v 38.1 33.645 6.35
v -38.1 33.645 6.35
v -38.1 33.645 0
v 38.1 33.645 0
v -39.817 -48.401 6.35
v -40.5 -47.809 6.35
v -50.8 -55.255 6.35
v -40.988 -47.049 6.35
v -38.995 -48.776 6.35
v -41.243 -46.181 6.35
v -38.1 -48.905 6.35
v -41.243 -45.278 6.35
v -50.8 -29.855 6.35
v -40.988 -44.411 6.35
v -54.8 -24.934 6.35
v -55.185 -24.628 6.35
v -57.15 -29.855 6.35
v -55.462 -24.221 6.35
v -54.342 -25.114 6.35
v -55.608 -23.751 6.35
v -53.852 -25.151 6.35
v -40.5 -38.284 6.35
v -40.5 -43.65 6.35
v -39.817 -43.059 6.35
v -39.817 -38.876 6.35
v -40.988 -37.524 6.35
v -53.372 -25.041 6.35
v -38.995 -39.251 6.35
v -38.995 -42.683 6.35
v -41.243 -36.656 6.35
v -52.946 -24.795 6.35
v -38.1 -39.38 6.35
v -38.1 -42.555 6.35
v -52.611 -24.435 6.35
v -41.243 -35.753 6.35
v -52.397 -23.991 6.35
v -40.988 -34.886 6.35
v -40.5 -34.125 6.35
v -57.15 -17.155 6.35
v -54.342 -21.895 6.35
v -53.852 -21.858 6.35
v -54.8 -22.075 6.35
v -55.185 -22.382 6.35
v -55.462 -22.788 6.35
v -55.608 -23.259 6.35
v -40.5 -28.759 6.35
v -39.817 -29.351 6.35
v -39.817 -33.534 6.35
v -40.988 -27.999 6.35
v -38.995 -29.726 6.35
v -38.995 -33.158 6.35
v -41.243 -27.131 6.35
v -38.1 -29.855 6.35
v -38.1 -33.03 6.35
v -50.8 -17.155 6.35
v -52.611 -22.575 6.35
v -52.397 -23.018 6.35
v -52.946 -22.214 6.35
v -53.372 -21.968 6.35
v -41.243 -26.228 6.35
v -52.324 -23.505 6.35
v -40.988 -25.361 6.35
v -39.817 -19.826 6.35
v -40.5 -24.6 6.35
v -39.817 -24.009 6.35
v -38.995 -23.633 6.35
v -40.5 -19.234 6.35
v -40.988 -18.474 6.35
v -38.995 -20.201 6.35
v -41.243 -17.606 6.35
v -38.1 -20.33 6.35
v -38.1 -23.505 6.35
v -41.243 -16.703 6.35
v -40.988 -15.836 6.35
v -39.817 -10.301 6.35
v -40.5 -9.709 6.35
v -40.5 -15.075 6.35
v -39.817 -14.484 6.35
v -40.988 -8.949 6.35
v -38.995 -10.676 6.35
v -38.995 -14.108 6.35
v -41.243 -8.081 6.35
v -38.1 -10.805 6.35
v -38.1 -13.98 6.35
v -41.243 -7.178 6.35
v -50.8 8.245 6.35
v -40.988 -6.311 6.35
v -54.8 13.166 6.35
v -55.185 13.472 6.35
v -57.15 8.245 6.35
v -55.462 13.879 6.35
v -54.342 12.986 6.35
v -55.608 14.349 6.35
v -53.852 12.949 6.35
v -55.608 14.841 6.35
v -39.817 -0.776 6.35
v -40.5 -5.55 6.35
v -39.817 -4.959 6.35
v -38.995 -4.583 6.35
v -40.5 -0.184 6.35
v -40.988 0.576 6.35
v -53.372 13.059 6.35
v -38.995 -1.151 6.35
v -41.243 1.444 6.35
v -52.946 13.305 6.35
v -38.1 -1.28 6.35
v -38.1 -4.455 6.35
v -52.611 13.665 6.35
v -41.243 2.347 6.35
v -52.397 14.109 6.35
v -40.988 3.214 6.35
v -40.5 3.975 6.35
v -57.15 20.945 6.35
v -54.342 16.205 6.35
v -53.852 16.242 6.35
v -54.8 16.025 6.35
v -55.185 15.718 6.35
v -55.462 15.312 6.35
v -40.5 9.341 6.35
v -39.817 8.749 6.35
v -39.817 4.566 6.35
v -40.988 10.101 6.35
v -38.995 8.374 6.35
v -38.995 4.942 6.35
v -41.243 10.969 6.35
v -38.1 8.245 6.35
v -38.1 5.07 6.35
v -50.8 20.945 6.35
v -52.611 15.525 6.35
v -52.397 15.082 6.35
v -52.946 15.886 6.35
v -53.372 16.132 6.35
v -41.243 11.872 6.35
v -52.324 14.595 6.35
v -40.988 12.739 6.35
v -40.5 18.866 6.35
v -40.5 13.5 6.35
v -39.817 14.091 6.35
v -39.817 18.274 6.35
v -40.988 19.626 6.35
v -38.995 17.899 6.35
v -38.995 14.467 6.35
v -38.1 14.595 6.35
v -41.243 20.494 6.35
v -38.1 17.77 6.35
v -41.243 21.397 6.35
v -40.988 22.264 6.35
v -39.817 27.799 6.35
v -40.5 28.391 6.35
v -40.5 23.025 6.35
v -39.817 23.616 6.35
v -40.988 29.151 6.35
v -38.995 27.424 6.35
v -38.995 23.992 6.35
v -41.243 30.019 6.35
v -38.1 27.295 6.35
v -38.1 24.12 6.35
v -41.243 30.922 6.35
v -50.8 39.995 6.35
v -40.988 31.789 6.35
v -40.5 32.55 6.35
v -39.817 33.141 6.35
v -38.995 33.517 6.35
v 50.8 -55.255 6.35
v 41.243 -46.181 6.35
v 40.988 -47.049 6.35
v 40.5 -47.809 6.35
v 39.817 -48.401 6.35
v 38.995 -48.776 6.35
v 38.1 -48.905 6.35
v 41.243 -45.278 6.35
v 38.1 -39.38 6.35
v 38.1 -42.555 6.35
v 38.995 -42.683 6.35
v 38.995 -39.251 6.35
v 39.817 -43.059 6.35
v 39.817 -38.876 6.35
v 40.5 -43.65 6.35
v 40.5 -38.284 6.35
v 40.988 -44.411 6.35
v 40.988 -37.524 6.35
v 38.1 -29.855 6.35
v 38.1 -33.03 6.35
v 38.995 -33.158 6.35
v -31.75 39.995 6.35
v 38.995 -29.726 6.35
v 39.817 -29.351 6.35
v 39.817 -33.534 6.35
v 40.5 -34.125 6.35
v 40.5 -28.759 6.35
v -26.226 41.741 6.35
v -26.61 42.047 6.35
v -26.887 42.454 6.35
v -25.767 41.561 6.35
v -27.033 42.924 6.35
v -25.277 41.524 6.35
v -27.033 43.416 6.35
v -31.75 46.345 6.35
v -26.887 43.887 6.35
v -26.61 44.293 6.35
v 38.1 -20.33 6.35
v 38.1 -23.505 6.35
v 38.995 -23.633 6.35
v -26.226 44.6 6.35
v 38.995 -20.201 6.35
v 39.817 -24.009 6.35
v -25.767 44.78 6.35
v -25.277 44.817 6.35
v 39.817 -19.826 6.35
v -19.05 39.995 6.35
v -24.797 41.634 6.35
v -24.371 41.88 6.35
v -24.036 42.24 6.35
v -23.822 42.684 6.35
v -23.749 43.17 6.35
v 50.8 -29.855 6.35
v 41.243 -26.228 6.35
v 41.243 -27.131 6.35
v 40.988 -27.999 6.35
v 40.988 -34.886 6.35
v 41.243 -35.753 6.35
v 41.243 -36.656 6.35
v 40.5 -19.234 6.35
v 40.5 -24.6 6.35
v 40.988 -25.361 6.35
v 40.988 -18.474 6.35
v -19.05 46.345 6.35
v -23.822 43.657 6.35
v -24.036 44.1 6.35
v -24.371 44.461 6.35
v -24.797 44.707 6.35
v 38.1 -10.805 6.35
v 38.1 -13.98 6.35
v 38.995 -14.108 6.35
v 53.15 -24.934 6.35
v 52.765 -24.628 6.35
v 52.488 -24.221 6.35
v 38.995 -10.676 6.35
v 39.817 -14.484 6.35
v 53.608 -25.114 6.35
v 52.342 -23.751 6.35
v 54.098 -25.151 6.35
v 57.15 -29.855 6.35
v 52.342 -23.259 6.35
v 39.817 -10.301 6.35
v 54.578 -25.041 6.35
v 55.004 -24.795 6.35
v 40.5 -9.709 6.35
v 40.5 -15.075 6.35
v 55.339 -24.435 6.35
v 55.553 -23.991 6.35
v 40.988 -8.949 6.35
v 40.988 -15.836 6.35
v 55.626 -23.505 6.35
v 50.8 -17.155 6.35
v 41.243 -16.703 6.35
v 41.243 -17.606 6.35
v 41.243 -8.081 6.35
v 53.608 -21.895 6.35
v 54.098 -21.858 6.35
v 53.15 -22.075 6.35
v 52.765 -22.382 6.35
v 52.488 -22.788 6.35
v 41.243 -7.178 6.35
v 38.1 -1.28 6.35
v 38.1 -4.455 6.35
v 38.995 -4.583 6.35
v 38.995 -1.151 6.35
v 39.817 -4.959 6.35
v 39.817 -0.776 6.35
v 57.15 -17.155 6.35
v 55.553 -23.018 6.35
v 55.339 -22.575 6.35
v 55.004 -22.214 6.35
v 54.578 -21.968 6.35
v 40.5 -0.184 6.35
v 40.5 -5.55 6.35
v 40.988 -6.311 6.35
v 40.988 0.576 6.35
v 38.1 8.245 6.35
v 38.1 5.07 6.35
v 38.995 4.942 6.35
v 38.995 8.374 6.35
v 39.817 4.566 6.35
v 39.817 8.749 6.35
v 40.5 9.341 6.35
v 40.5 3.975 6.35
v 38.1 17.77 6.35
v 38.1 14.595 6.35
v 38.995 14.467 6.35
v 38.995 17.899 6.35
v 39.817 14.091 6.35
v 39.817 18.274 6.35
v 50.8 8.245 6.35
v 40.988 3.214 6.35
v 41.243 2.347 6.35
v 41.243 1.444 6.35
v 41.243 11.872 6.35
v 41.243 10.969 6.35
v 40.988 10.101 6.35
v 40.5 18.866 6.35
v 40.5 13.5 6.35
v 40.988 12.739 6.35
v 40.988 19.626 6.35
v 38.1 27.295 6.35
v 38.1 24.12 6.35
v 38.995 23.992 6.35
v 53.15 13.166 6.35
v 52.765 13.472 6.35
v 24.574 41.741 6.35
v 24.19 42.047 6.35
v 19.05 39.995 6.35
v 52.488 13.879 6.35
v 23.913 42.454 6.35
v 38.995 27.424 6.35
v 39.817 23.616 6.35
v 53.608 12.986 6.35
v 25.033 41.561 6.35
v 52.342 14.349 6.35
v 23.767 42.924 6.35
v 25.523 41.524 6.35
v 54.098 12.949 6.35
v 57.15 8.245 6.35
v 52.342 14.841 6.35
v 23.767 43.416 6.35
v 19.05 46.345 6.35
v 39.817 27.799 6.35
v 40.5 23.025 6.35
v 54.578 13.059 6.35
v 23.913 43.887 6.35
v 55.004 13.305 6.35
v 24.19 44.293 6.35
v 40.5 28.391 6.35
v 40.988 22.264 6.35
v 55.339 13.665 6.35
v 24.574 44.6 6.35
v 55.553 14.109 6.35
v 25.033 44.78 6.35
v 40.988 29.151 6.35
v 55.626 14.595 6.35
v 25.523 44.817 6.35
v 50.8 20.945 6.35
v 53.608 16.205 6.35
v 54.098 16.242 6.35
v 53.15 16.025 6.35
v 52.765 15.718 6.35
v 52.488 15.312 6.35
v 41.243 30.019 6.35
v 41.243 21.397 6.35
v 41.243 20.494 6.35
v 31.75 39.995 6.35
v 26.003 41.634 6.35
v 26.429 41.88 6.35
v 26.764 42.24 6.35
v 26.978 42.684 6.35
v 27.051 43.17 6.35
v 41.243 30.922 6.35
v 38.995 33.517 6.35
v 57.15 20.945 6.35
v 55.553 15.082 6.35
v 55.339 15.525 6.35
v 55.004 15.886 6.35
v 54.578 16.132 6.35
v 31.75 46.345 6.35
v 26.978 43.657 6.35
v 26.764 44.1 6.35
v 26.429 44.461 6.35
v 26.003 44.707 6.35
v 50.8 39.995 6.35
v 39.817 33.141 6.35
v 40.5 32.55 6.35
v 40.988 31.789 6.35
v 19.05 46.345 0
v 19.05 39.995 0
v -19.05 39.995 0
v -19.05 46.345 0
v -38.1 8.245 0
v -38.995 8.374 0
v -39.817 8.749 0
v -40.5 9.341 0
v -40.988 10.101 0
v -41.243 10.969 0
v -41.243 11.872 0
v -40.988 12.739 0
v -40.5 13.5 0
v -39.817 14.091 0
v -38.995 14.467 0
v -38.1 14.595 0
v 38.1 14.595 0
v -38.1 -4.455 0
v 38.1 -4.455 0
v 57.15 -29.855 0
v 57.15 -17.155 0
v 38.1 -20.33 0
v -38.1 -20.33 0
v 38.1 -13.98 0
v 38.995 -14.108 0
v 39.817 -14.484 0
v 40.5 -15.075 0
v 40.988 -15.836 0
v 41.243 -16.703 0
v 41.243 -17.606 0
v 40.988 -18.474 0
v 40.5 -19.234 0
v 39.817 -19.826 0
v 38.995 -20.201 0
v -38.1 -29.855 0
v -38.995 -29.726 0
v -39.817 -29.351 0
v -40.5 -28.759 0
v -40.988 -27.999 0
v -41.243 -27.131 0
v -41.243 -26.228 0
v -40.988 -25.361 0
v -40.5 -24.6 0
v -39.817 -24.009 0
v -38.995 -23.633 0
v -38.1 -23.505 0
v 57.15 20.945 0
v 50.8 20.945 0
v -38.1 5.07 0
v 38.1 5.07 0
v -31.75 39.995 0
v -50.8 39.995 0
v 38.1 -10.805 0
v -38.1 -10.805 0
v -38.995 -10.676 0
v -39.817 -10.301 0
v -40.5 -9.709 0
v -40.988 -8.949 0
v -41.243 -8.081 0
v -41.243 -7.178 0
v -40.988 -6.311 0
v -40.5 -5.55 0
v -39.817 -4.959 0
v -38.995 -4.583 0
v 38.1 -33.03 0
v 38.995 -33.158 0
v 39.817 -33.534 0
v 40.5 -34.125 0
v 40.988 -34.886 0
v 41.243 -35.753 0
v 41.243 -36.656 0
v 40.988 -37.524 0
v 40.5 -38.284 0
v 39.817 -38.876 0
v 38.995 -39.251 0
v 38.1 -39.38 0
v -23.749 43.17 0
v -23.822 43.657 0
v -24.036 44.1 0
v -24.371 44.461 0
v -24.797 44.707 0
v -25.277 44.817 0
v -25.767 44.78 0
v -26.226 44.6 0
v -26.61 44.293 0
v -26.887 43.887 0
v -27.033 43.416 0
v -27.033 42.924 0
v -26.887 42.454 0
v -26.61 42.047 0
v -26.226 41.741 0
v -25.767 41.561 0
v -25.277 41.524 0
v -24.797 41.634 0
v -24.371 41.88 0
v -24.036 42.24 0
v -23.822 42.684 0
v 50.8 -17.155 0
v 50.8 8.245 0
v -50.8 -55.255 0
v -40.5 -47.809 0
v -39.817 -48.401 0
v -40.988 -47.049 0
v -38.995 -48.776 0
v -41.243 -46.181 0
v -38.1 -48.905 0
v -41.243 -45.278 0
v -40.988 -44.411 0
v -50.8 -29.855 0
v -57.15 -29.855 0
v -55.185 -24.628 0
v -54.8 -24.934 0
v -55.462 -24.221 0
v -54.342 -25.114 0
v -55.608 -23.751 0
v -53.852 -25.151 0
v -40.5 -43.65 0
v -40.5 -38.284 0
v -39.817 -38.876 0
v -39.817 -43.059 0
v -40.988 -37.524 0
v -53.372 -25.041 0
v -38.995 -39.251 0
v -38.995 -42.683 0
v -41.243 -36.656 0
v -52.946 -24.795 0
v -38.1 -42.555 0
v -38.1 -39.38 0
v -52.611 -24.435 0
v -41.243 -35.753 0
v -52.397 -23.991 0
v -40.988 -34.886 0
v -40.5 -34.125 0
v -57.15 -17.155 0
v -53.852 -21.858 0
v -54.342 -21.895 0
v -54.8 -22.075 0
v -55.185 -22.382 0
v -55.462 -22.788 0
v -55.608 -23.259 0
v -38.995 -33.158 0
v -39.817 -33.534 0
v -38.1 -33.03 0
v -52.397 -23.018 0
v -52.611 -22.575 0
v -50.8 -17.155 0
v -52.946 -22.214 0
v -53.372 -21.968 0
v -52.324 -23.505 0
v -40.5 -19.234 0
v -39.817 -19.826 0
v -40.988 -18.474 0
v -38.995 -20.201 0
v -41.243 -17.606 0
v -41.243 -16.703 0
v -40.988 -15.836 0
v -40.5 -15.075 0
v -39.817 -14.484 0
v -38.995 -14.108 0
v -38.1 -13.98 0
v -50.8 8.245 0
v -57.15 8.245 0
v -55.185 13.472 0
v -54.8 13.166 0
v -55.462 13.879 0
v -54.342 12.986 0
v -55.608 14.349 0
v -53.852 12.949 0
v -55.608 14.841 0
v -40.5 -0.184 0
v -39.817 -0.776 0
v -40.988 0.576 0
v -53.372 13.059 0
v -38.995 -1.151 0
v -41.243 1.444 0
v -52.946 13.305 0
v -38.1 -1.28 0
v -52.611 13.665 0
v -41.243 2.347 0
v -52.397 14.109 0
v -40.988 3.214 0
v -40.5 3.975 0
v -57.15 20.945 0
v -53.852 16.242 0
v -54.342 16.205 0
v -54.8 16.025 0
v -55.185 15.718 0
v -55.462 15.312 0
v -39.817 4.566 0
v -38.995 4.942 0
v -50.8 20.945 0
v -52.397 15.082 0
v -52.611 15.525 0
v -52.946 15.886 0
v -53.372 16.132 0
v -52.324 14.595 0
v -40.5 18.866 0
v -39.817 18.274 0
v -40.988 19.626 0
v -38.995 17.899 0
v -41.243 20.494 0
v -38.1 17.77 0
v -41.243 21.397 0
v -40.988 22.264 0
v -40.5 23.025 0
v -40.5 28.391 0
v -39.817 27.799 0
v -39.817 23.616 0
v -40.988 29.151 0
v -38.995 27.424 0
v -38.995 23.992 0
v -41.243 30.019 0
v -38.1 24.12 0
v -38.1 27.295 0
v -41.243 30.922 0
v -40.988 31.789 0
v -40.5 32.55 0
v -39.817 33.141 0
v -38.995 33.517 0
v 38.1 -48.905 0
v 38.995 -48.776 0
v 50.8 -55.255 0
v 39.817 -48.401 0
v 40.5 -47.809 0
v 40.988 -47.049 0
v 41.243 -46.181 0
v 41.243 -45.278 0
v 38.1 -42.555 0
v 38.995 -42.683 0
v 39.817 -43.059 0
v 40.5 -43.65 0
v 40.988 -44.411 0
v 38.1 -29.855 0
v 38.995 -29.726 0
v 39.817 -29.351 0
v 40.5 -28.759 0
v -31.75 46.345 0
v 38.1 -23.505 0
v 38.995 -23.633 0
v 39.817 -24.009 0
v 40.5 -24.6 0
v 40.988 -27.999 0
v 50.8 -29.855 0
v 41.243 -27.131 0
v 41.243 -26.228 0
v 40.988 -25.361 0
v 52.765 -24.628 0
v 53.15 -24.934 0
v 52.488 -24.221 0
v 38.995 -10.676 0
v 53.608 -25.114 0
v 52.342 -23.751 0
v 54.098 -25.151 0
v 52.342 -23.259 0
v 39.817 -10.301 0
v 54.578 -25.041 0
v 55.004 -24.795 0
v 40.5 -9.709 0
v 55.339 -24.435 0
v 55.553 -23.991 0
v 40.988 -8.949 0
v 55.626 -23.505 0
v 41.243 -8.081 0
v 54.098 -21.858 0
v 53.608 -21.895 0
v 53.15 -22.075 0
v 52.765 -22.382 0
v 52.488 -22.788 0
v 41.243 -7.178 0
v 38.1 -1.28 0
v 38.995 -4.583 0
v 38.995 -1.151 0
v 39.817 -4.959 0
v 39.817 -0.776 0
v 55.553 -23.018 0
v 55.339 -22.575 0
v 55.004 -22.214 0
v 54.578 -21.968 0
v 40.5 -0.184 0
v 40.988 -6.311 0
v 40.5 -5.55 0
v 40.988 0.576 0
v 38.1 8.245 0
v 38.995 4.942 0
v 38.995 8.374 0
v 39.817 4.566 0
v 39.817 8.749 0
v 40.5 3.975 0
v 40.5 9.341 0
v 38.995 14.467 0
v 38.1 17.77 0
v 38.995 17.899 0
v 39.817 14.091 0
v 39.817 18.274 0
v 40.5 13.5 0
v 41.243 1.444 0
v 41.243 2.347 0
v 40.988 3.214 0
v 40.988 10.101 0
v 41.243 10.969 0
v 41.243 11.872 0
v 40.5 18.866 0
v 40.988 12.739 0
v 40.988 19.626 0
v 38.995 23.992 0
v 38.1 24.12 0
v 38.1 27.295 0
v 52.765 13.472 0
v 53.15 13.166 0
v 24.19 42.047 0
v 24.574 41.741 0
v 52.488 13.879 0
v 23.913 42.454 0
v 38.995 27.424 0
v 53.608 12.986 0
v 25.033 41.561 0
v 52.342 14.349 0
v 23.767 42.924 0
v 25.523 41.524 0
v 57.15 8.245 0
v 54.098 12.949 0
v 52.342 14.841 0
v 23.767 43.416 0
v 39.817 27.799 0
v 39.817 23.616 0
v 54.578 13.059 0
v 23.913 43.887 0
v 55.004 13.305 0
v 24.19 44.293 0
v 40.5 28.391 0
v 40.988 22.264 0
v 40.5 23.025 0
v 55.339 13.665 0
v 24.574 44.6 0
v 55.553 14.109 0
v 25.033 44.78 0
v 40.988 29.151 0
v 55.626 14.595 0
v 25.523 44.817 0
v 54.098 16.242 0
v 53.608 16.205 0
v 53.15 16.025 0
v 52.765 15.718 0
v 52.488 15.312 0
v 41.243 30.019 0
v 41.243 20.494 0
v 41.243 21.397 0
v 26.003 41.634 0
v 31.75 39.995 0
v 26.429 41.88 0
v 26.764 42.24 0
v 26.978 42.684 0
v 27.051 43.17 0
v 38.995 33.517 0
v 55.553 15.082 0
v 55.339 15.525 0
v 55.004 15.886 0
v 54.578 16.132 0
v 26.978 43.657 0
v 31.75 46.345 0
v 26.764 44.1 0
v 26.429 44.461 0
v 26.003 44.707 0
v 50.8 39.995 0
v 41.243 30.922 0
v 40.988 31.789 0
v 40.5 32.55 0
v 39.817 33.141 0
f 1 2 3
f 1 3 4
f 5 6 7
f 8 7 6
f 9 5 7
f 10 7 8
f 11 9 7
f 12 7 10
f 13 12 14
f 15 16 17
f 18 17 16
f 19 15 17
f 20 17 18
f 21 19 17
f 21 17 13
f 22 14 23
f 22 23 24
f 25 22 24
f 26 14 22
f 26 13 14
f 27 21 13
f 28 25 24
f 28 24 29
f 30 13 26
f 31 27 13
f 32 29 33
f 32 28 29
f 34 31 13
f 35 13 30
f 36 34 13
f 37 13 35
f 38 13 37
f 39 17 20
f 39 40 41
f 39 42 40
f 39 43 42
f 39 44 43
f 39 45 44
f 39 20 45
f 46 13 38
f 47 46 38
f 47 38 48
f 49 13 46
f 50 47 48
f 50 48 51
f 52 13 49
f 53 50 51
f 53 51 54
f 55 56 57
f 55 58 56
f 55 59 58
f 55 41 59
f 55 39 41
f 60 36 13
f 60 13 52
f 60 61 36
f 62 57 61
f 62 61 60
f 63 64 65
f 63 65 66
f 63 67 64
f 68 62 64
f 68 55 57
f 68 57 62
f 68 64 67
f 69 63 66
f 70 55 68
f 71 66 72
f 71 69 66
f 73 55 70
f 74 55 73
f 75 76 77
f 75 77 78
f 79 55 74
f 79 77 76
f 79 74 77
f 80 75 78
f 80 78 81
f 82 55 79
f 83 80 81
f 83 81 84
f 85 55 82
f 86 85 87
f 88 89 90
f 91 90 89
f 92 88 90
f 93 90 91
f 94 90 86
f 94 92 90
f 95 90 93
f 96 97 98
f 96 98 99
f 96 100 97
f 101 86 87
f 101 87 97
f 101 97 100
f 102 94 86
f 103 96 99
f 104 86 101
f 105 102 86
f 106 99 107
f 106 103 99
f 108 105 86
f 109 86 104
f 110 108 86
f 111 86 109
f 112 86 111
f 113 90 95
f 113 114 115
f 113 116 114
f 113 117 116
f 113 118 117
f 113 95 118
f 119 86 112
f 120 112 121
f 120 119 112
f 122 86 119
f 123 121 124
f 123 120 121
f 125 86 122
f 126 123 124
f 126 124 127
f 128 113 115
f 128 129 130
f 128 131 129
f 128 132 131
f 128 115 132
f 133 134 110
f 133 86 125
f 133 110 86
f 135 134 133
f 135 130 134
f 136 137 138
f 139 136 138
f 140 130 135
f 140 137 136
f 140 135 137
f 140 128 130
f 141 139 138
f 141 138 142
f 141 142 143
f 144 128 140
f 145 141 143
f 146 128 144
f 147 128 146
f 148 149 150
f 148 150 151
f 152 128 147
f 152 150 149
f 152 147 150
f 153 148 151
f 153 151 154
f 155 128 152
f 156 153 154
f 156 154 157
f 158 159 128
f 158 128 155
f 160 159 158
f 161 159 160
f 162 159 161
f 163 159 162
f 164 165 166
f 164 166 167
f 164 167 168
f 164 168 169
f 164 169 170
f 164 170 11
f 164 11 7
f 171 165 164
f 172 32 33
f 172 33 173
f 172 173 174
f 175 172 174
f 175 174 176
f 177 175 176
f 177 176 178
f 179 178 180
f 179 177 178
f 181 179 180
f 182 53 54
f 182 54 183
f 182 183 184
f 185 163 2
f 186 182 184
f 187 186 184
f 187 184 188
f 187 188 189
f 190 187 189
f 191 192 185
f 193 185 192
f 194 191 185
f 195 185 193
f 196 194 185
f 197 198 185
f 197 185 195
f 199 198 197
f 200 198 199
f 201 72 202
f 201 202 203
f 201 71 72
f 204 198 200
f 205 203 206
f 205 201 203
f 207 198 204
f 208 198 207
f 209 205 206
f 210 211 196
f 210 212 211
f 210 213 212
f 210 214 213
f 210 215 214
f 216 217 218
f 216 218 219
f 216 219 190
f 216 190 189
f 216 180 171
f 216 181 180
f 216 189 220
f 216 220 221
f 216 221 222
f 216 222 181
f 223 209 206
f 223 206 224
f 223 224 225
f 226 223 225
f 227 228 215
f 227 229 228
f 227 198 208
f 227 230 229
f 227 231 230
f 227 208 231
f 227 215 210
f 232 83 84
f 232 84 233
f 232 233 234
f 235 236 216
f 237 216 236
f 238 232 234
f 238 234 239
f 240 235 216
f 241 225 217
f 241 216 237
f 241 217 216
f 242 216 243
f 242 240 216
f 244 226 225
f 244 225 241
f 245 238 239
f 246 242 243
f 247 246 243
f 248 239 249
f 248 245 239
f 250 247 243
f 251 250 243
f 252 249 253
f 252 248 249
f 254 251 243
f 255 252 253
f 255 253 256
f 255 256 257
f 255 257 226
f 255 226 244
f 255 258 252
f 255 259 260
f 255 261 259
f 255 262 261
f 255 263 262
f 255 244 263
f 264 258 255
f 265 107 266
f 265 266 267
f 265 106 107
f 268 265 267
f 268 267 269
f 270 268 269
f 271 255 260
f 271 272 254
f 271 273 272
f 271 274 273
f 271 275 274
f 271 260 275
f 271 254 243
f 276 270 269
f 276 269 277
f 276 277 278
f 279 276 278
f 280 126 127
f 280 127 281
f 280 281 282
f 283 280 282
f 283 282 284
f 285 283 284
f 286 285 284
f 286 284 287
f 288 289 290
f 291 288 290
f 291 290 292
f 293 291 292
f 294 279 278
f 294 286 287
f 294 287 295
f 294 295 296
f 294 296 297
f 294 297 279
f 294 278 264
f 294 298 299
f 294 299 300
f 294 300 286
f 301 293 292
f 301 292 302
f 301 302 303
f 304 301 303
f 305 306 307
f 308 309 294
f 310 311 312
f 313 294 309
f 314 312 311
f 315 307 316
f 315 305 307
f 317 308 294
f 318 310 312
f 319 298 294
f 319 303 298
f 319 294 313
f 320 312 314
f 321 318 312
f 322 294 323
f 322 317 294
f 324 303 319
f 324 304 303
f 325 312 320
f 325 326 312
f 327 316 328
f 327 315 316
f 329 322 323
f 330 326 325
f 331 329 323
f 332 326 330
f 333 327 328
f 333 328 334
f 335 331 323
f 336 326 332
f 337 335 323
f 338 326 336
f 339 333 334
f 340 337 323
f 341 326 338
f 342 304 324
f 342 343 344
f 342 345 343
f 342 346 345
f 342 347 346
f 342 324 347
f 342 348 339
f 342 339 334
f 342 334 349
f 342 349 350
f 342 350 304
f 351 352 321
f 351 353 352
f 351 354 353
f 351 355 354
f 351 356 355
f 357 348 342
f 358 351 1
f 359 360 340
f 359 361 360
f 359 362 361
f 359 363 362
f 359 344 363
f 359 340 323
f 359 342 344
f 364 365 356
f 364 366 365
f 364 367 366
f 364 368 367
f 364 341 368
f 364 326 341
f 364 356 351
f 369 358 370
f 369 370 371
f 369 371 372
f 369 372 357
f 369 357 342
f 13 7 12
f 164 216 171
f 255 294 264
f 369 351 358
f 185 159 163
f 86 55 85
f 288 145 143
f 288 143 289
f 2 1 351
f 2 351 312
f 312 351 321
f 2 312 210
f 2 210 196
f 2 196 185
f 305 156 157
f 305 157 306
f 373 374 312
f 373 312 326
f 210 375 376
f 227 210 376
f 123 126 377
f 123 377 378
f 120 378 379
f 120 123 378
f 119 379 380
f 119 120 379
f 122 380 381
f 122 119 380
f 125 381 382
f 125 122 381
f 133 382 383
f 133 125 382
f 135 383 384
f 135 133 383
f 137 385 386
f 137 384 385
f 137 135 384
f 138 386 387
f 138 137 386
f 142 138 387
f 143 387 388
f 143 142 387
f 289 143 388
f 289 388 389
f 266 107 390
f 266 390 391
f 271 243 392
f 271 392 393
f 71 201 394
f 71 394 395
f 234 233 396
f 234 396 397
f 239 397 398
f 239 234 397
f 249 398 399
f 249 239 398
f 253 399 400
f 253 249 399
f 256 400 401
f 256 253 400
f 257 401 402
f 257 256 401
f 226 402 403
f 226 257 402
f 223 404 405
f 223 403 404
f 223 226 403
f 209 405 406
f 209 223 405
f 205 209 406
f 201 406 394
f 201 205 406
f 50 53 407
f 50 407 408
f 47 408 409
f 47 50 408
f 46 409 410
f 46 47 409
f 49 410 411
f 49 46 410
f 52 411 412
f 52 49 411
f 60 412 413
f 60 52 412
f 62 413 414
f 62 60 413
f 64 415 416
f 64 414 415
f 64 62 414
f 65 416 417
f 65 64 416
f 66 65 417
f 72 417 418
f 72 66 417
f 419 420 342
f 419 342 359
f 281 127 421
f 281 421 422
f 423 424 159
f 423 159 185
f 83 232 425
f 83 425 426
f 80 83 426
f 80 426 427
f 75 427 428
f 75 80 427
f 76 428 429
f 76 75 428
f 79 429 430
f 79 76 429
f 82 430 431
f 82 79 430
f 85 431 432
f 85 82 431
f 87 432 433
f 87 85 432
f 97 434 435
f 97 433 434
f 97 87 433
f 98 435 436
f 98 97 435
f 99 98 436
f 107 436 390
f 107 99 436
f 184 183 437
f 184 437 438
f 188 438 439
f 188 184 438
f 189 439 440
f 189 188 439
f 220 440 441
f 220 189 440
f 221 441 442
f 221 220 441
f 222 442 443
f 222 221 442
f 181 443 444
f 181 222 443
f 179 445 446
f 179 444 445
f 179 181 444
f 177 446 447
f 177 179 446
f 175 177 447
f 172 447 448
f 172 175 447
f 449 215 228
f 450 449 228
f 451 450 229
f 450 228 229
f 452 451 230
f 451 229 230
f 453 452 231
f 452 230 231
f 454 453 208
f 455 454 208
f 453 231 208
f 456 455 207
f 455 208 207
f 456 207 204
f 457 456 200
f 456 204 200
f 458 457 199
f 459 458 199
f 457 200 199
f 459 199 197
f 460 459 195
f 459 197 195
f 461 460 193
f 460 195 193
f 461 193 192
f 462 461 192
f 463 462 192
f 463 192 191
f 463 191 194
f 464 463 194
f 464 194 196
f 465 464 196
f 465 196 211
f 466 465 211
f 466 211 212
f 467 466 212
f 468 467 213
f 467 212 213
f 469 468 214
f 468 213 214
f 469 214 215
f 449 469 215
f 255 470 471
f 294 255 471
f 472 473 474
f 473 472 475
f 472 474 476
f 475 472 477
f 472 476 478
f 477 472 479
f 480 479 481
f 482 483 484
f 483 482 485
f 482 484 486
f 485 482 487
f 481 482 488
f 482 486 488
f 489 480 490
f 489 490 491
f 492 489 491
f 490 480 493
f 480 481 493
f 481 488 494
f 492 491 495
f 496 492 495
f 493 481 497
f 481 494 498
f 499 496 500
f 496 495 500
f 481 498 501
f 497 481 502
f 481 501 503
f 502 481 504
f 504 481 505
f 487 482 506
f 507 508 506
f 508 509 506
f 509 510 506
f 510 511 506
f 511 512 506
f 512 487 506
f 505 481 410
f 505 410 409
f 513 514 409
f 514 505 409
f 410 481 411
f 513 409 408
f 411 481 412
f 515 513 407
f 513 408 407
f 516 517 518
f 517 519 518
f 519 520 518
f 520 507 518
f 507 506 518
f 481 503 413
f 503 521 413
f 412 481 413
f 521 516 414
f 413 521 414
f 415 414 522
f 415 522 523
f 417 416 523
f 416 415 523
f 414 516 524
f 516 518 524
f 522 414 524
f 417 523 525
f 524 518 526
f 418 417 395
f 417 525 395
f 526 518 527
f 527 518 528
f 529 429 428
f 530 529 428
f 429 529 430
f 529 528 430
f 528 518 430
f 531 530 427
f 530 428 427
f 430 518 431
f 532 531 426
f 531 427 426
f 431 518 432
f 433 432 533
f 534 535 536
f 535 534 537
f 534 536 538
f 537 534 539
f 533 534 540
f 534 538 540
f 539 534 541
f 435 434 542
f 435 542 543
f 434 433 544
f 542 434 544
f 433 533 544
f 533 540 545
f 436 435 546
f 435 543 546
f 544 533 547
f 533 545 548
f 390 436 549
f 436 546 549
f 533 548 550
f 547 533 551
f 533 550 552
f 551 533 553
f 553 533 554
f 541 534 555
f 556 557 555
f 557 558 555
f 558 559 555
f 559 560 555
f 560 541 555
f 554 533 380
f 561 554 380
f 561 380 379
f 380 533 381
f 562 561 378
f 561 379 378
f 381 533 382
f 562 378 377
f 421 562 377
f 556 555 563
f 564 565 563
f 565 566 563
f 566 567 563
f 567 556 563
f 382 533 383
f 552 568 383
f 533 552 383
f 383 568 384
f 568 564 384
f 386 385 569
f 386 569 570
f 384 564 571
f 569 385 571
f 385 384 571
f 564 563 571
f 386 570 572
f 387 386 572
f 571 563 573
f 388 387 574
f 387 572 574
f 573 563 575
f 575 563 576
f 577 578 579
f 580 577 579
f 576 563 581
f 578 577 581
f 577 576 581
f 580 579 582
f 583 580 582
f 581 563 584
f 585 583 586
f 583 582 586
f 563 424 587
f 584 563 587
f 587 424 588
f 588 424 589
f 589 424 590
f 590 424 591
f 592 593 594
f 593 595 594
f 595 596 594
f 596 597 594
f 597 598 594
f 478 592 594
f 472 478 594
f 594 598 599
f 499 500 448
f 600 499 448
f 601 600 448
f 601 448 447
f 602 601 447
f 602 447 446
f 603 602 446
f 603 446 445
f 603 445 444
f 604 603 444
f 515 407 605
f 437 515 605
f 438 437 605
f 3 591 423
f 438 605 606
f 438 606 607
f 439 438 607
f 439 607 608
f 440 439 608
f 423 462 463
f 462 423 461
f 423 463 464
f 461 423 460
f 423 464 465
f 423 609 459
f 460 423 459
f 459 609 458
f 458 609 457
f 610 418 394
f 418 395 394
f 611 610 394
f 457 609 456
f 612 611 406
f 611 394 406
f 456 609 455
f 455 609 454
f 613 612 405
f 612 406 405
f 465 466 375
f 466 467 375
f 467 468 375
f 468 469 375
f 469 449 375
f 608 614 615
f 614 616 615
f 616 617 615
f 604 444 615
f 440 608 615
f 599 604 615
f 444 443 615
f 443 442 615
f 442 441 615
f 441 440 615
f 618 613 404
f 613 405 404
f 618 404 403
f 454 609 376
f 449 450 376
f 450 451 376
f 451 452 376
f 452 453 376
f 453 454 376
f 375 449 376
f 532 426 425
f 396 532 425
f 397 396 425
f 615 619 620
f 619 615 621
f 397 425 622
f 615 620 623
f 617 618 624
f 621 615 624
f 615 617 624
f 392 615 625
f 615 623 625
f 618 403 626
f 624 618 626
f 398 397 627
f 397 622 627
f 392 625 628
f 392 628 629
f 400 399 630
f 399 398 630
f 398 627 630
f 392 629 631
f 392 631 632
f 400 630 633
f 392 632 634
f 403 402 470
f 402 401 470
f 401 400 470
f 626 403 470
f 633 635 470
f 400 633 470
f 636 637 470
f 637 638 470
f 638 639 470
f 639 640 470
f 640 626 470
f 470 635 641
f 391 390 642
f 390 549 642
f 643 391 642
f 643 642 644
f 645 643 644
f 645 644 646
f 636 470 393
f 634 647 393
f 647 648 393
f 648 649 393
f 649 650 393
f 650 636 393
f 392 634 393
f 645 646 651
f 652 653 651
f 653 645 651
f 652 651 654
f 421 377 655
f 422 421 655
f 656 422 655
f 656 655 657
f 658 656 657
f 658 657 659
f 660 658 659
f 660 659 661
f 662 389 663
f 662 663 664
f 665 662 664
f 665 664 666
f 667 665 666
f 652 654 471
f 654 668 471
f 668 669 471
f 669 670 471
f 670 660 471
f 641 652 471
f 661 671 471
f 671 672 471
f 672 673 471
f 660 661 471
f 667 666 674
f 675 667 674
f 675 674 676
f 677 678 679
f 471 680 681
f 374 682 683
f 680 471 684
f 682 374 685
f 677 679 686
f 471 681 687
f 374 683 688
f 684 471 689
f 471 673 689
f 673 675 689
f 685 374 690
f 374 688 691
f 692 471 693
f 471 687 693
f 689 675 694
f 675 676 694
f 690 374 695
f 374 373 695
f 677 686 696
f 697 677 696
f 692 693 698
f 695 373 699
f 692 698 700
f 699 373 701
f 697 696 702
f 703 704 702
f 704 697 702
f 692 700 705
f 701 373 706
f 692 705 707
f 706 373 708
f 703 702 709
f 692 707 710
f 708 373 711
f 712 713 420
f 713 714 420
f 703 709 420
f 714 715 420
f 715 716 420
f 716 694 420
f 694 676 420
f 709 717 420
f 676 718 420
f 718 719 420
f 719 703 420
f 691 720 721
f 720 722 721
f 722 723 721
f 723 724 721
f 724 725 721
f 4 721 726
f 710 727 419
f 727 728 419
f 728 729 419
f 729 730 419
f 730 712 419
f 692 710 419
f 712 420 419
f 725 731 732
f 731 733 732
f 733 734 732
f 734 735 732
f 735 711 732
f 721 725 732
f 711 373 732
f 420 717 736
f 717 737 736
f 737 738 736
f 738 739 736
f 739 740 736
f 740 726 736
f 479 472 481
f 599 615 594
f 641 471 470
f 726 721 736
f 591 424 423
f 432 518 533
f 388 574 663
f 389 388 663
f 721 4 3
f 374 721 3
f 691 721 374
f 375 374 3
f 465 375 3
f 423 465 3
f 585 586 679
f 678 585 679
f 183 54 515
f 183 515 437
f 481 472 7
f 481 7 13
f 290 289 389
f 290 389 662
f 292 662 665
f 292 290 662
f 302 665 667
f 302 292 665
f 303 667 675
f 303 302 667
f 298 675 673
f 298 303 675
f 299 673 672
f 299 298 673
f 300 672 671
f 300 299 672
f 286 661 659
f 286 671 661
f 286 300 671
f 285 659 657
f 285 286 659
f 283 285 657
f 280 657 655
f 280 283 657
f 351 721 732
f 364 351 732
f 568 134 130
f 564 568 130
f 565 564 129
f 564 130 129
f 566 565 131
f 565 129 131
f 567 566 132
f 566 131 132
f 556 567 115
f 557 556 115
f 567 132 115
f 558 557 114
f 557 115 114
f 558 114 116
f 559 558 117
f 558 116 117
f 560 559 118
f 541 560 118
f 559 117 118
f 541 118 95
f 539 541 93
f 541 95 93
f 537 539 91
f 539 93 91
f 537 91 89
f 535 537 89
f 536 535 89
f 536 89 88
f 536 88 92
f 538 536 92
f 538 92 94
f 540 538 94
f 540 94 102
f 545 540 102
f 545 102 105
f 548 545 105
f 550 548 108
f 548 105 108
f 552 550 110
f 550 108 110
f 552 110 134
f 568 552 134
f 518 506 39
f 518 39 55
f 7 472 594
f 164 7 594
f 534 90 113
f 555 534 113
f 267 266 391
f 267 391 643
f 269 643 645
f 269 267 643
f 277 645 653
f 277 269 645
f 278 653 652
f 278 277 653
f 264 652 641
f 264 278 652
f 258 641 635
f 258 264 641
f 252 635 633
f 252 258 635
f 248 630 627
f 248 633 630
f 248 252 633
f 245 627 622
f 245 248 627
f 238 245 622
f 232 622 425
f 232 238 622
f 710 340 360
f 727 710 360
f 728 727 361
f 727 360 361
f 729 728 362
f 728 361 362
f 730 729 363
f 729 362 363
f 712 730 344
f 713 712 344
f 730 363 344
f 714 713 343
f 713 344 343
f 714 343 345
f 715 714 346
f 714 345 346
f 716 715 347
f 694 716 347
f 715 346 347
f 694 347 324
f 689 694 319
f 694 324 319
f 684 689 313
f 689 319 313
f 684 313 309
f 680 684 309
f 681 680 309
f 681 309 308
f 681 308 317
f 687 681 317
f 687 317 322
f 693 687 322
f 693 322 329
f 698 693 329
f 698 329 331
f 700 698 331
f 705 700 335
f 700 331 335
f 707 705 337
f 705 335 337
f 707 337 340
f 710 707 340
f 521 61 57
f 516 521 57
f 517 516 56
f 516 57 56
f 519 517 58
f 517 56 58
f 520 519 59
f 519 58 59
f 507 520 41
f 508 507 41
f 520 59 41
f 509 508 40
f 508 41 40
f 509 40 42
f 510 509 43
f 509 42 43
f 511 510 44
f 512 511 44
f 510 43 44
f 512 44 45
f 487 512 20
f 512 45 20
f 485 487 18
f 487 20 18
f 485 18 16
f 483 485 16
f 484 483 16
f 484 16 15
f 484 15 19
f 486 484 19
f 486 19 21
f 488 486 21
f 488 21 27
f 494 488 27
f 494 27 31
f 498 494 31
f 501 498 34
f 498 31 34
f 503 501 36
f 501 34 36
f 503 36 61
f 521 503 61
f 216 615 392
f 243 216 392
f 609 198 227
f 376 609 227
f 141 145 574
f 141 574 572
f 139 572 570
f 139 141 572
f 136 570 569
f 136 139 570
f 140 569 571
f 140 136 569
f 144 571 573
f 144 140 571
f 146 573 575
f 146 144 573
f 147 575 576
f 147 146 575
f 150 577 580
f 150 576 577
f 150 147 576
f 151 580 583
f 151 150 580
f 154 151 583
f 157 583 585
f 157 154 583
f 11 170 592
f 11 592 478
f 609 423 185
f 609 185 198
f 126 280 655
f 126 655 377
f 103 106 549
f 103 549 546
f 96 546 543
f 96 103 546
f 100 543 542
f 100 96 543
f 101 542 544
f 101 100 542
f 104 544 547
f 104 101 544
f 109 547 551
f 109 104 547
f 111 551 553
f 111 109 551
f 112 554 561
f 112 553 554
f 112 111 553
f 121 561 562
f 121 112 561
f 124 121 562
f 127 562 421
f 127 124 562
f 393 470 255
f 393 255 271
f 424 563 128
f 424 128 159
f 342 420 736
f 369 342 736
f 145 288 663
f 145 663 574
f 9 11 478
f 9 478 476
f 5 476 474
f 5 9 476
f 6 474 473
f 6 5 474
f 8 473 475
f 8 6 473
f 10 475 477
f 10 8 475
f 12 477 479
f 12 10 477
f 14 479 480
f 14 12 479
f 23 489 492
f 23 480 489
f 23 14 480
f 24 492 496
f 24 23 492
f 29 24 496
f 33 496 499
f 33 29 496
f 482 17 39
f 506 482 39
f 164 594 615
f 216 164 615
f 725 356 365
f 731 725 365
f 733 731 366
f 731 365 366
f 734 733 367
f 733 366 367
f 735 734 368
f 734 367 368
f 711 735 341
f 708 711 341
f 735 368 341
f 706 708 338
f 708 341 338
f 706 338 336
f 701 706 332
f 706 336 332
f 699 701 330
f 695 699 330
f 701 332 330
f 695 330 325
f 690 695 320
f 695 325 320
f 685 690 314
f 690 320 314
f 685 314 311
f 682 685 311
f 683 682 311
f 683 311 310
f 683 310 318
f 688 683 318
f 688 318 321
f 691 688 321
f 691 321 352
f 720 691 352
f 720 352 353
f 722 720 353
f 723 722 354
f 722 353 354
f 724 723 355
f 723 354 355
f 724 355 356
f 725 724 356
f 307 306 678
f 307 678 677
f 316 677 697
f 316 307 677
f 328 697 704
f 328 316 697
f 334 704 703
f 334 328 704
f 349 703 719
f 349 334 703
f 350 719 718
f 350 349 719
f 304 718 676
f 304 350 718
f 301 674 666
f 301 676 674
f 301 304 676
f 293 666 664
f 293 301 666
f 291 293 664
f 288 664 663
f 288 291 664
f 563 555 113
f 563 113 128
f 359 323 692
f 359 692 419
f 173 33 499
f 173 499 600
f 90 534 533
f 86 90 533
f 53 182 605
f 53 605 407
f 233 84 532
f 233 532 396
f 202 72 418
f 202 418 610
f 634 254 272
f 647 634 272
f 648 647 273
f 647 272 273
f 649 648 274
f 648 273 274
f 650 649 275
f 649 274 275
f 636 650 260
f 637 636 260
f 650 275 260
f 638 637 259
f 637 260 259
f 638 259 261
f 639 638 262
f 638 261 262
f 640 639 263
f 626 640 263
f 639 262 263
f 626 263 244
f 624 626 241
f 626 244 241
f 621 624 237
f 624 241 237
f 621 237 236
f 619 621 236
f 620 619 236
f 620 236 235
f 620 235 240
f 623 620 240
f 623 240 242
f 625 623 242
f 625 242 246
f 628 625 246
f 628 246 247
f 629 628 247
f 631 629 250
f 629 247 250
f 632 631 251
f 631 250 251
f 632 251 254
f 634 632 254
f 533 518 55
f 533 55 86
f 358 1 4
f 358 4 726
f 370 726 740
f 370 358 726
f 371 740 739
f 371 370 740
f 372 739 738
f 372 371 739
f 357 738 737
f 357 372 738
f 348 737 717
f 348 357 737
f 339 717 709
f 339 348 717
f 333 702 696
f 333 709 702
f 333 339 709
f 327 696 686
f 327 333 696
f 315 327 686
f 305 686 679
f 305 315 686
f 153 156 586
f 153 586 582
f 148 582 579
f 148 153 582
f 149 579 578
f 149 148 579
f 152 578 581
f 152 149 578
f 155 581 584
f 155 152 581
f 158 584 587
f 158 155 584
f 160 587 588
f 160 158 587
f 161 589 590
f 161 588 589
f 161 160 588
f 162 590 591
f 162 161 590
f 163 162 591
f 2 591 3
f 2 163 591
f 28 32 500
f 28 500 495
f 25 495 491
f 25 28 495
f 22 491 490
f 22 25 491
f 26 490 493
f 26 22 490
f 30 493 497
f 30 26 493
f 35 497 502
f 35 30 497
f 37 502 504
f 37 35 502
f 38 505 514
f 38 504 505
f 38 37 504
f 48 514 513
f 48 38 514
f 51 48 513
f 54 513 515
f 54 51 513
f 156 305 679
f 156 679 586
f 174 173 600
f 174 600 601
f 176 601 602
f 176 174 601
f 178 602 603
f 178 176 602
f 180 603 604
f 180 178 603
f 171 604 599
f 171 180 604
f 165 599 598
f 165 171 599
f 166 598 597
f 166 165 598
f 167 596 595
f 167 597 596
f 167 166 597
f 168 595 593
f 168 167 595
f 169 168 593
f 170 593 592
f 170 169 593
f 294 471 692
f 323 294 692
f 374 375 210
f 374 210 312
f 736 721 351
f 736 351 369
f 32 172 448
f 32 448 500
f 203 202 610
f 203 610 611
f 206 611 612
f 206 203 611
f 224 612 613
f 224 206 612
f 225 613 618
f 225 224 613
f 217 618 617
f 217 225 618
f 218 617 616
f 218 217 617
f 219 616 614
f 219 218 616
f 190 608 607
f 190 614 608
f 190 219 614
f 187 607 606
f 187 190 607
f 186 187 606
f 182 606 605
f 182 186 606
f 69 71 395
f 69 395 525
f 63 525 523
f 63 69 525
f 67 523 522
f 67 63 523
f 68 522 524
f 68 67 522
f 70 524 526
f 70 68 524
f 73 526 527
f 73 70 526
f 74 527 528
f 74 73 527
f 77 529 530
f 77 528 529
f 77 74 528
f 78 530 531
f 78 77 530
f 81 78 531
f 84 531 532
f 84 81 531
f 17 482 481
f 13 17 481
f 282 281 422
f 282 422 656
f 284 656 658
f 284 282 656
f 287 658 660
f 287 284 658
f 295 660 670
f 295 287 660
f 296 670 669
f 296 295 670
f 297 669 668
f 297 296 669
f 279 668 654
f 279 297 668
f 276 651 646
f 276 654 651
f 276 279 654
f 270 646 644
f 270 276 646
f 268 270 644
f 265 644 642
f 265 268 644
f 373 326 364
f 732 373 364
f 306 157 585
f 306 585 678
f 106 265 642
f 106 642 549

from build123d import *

# Parameters (mm, degrees)
SKETCH1_W           = 101.6
SKETCH1_H           = 95.25
BOSS_EXTRUDE1_DEPTH = 6.35
SKETCH2_W           = 12.7
SKETCH2_H           = 6.35
SKETCH2_R           = 1.651
SKETCH2_W_2         = 6.35
SKETCH2_H_2         = 12.7
BOSS_EXTRUDE2_DEPTH = 6.35
CUT_EXTRUDE1_DEPTH  = 80.746567925
LPATTERN1_COUNT     = 9
LPATTERN1_PITCH     = 9.525


with BuildPart() as part:
    # Sketch1 → Boss-Extrude1 (new body)
    with BuildSketch(Plane.XY):
        with Locations((0, -7.629593436)):
            Rectangle(SKETCH1_W, SKETCH1_H)
    extrude(amount=BOSS_EXTRUDE1_DEPTH)

    # Sketch2 → Boss-Extrude2 (add)
    # profile 1 of 6: a face of its own
    with BuildSketch(Plane.XY.offset(6.35)):
        with Locations((-25.4, 43.170406564)):
            Rectangle(SKETCH2_W, SKETCH2_H)
        with Locations((-25.4, 43.170406564)):
            Circle(SKETCH2_R, mode=Mode.SUBTRACT)
    # profile 2 of 6: a face of its own
    with BuildSketch(Plane.XY.offset(6.35)):
        with Locations((25.4, 43.170406564)):
            Rectangle(SKETCH2_W, SKETCH2_H)
        with Locations((25.4, 43.170406564)):
            Circle(SKETCH2_R, mode=Mode.SUBTRACT)
    # profile 3 of 6: a face of its own
    with BuildSketch(Plane.XY.offset(6.35)):
        with Locations((-53.975, 14.595406564)):
            Rectangle(SKETCH2_W_2, SKETCH2_H_2)
        with Locations((-53.975, 14.595406564)):
            Circle(SKETCH2_R, mode=Mode.SUBTRACT)
    # profile 4 of 6: a face of its own
    with BuildSketch(Plane.XY.offset(6.35)):
        with Locations((53.975, 14.595406564)):
            Rectangle(SKETCH2_W_2, SKETCH2_H_2)
        with Locations((53.975, 14.595406564)):
            Circle(SKETCH2_R, mode=Mode.SUBTRACT)
    # profile 5 of 6: a face of its own
    with BuildSketch(Plane.XY.offset(6.35)):
        with Locations((-53.975, -23.504593436)):
            Rectangle(SKETCH2_W_2, SKETCH2_H_2)
        with Locations((-53.975, -23.504593436)):
            Circle(SKETCH2_R, mode=Mode.SUBTRACT)
    # profile 6 of 6: a face of its own
    with BuildSketch(Plane.XY.offset(6.35)):
        with Locations((53.975, -23.504593436)):
            Rectangle(SKETCH2_W_2, SKETCH2_H_2)
        with Locations((53.975, -23.504593436)):
            Circle(SKETCH2_R, mode=Mode.SUBTRACT)
    extrude(amount=-BOSS_EXTRUDE2_DEPTH)

    # Sketch3 → Cut-Extrude1 (cut, through all)
    with BuildSketch(Plane.XY.offset(6.35)):
        with BuildLine():
            Line((-38.1, 33.645406564), (38.1, 33.645406564))
            ThreePointArc((38.1, 33.645406564), (41.275, 30.470406564), (38.1, 27.295406564))
            Line((38.1, 27.295406564), (-38.1, 27.295406564))
            ThreePointArc((-38.1, 27.295406564), (-41.275, 30.470406564), (-38.1, 33.645406564))
        make_face()
    cut_extrude1 = extrude(amount=-CUT_EXTRUDE1_DEPTH, mode=Mode.SUBTRACT)

    # LPattern1: Cut-Extrude1 ×9
    with Locations(*[(0, -i * LPATTERN1_PITCH, 0) for i in range(1, LPATTERN1_COUNT)]):
        add(cut_extrude1, mode=Mode.SUBTRACT)


solid = part.part
